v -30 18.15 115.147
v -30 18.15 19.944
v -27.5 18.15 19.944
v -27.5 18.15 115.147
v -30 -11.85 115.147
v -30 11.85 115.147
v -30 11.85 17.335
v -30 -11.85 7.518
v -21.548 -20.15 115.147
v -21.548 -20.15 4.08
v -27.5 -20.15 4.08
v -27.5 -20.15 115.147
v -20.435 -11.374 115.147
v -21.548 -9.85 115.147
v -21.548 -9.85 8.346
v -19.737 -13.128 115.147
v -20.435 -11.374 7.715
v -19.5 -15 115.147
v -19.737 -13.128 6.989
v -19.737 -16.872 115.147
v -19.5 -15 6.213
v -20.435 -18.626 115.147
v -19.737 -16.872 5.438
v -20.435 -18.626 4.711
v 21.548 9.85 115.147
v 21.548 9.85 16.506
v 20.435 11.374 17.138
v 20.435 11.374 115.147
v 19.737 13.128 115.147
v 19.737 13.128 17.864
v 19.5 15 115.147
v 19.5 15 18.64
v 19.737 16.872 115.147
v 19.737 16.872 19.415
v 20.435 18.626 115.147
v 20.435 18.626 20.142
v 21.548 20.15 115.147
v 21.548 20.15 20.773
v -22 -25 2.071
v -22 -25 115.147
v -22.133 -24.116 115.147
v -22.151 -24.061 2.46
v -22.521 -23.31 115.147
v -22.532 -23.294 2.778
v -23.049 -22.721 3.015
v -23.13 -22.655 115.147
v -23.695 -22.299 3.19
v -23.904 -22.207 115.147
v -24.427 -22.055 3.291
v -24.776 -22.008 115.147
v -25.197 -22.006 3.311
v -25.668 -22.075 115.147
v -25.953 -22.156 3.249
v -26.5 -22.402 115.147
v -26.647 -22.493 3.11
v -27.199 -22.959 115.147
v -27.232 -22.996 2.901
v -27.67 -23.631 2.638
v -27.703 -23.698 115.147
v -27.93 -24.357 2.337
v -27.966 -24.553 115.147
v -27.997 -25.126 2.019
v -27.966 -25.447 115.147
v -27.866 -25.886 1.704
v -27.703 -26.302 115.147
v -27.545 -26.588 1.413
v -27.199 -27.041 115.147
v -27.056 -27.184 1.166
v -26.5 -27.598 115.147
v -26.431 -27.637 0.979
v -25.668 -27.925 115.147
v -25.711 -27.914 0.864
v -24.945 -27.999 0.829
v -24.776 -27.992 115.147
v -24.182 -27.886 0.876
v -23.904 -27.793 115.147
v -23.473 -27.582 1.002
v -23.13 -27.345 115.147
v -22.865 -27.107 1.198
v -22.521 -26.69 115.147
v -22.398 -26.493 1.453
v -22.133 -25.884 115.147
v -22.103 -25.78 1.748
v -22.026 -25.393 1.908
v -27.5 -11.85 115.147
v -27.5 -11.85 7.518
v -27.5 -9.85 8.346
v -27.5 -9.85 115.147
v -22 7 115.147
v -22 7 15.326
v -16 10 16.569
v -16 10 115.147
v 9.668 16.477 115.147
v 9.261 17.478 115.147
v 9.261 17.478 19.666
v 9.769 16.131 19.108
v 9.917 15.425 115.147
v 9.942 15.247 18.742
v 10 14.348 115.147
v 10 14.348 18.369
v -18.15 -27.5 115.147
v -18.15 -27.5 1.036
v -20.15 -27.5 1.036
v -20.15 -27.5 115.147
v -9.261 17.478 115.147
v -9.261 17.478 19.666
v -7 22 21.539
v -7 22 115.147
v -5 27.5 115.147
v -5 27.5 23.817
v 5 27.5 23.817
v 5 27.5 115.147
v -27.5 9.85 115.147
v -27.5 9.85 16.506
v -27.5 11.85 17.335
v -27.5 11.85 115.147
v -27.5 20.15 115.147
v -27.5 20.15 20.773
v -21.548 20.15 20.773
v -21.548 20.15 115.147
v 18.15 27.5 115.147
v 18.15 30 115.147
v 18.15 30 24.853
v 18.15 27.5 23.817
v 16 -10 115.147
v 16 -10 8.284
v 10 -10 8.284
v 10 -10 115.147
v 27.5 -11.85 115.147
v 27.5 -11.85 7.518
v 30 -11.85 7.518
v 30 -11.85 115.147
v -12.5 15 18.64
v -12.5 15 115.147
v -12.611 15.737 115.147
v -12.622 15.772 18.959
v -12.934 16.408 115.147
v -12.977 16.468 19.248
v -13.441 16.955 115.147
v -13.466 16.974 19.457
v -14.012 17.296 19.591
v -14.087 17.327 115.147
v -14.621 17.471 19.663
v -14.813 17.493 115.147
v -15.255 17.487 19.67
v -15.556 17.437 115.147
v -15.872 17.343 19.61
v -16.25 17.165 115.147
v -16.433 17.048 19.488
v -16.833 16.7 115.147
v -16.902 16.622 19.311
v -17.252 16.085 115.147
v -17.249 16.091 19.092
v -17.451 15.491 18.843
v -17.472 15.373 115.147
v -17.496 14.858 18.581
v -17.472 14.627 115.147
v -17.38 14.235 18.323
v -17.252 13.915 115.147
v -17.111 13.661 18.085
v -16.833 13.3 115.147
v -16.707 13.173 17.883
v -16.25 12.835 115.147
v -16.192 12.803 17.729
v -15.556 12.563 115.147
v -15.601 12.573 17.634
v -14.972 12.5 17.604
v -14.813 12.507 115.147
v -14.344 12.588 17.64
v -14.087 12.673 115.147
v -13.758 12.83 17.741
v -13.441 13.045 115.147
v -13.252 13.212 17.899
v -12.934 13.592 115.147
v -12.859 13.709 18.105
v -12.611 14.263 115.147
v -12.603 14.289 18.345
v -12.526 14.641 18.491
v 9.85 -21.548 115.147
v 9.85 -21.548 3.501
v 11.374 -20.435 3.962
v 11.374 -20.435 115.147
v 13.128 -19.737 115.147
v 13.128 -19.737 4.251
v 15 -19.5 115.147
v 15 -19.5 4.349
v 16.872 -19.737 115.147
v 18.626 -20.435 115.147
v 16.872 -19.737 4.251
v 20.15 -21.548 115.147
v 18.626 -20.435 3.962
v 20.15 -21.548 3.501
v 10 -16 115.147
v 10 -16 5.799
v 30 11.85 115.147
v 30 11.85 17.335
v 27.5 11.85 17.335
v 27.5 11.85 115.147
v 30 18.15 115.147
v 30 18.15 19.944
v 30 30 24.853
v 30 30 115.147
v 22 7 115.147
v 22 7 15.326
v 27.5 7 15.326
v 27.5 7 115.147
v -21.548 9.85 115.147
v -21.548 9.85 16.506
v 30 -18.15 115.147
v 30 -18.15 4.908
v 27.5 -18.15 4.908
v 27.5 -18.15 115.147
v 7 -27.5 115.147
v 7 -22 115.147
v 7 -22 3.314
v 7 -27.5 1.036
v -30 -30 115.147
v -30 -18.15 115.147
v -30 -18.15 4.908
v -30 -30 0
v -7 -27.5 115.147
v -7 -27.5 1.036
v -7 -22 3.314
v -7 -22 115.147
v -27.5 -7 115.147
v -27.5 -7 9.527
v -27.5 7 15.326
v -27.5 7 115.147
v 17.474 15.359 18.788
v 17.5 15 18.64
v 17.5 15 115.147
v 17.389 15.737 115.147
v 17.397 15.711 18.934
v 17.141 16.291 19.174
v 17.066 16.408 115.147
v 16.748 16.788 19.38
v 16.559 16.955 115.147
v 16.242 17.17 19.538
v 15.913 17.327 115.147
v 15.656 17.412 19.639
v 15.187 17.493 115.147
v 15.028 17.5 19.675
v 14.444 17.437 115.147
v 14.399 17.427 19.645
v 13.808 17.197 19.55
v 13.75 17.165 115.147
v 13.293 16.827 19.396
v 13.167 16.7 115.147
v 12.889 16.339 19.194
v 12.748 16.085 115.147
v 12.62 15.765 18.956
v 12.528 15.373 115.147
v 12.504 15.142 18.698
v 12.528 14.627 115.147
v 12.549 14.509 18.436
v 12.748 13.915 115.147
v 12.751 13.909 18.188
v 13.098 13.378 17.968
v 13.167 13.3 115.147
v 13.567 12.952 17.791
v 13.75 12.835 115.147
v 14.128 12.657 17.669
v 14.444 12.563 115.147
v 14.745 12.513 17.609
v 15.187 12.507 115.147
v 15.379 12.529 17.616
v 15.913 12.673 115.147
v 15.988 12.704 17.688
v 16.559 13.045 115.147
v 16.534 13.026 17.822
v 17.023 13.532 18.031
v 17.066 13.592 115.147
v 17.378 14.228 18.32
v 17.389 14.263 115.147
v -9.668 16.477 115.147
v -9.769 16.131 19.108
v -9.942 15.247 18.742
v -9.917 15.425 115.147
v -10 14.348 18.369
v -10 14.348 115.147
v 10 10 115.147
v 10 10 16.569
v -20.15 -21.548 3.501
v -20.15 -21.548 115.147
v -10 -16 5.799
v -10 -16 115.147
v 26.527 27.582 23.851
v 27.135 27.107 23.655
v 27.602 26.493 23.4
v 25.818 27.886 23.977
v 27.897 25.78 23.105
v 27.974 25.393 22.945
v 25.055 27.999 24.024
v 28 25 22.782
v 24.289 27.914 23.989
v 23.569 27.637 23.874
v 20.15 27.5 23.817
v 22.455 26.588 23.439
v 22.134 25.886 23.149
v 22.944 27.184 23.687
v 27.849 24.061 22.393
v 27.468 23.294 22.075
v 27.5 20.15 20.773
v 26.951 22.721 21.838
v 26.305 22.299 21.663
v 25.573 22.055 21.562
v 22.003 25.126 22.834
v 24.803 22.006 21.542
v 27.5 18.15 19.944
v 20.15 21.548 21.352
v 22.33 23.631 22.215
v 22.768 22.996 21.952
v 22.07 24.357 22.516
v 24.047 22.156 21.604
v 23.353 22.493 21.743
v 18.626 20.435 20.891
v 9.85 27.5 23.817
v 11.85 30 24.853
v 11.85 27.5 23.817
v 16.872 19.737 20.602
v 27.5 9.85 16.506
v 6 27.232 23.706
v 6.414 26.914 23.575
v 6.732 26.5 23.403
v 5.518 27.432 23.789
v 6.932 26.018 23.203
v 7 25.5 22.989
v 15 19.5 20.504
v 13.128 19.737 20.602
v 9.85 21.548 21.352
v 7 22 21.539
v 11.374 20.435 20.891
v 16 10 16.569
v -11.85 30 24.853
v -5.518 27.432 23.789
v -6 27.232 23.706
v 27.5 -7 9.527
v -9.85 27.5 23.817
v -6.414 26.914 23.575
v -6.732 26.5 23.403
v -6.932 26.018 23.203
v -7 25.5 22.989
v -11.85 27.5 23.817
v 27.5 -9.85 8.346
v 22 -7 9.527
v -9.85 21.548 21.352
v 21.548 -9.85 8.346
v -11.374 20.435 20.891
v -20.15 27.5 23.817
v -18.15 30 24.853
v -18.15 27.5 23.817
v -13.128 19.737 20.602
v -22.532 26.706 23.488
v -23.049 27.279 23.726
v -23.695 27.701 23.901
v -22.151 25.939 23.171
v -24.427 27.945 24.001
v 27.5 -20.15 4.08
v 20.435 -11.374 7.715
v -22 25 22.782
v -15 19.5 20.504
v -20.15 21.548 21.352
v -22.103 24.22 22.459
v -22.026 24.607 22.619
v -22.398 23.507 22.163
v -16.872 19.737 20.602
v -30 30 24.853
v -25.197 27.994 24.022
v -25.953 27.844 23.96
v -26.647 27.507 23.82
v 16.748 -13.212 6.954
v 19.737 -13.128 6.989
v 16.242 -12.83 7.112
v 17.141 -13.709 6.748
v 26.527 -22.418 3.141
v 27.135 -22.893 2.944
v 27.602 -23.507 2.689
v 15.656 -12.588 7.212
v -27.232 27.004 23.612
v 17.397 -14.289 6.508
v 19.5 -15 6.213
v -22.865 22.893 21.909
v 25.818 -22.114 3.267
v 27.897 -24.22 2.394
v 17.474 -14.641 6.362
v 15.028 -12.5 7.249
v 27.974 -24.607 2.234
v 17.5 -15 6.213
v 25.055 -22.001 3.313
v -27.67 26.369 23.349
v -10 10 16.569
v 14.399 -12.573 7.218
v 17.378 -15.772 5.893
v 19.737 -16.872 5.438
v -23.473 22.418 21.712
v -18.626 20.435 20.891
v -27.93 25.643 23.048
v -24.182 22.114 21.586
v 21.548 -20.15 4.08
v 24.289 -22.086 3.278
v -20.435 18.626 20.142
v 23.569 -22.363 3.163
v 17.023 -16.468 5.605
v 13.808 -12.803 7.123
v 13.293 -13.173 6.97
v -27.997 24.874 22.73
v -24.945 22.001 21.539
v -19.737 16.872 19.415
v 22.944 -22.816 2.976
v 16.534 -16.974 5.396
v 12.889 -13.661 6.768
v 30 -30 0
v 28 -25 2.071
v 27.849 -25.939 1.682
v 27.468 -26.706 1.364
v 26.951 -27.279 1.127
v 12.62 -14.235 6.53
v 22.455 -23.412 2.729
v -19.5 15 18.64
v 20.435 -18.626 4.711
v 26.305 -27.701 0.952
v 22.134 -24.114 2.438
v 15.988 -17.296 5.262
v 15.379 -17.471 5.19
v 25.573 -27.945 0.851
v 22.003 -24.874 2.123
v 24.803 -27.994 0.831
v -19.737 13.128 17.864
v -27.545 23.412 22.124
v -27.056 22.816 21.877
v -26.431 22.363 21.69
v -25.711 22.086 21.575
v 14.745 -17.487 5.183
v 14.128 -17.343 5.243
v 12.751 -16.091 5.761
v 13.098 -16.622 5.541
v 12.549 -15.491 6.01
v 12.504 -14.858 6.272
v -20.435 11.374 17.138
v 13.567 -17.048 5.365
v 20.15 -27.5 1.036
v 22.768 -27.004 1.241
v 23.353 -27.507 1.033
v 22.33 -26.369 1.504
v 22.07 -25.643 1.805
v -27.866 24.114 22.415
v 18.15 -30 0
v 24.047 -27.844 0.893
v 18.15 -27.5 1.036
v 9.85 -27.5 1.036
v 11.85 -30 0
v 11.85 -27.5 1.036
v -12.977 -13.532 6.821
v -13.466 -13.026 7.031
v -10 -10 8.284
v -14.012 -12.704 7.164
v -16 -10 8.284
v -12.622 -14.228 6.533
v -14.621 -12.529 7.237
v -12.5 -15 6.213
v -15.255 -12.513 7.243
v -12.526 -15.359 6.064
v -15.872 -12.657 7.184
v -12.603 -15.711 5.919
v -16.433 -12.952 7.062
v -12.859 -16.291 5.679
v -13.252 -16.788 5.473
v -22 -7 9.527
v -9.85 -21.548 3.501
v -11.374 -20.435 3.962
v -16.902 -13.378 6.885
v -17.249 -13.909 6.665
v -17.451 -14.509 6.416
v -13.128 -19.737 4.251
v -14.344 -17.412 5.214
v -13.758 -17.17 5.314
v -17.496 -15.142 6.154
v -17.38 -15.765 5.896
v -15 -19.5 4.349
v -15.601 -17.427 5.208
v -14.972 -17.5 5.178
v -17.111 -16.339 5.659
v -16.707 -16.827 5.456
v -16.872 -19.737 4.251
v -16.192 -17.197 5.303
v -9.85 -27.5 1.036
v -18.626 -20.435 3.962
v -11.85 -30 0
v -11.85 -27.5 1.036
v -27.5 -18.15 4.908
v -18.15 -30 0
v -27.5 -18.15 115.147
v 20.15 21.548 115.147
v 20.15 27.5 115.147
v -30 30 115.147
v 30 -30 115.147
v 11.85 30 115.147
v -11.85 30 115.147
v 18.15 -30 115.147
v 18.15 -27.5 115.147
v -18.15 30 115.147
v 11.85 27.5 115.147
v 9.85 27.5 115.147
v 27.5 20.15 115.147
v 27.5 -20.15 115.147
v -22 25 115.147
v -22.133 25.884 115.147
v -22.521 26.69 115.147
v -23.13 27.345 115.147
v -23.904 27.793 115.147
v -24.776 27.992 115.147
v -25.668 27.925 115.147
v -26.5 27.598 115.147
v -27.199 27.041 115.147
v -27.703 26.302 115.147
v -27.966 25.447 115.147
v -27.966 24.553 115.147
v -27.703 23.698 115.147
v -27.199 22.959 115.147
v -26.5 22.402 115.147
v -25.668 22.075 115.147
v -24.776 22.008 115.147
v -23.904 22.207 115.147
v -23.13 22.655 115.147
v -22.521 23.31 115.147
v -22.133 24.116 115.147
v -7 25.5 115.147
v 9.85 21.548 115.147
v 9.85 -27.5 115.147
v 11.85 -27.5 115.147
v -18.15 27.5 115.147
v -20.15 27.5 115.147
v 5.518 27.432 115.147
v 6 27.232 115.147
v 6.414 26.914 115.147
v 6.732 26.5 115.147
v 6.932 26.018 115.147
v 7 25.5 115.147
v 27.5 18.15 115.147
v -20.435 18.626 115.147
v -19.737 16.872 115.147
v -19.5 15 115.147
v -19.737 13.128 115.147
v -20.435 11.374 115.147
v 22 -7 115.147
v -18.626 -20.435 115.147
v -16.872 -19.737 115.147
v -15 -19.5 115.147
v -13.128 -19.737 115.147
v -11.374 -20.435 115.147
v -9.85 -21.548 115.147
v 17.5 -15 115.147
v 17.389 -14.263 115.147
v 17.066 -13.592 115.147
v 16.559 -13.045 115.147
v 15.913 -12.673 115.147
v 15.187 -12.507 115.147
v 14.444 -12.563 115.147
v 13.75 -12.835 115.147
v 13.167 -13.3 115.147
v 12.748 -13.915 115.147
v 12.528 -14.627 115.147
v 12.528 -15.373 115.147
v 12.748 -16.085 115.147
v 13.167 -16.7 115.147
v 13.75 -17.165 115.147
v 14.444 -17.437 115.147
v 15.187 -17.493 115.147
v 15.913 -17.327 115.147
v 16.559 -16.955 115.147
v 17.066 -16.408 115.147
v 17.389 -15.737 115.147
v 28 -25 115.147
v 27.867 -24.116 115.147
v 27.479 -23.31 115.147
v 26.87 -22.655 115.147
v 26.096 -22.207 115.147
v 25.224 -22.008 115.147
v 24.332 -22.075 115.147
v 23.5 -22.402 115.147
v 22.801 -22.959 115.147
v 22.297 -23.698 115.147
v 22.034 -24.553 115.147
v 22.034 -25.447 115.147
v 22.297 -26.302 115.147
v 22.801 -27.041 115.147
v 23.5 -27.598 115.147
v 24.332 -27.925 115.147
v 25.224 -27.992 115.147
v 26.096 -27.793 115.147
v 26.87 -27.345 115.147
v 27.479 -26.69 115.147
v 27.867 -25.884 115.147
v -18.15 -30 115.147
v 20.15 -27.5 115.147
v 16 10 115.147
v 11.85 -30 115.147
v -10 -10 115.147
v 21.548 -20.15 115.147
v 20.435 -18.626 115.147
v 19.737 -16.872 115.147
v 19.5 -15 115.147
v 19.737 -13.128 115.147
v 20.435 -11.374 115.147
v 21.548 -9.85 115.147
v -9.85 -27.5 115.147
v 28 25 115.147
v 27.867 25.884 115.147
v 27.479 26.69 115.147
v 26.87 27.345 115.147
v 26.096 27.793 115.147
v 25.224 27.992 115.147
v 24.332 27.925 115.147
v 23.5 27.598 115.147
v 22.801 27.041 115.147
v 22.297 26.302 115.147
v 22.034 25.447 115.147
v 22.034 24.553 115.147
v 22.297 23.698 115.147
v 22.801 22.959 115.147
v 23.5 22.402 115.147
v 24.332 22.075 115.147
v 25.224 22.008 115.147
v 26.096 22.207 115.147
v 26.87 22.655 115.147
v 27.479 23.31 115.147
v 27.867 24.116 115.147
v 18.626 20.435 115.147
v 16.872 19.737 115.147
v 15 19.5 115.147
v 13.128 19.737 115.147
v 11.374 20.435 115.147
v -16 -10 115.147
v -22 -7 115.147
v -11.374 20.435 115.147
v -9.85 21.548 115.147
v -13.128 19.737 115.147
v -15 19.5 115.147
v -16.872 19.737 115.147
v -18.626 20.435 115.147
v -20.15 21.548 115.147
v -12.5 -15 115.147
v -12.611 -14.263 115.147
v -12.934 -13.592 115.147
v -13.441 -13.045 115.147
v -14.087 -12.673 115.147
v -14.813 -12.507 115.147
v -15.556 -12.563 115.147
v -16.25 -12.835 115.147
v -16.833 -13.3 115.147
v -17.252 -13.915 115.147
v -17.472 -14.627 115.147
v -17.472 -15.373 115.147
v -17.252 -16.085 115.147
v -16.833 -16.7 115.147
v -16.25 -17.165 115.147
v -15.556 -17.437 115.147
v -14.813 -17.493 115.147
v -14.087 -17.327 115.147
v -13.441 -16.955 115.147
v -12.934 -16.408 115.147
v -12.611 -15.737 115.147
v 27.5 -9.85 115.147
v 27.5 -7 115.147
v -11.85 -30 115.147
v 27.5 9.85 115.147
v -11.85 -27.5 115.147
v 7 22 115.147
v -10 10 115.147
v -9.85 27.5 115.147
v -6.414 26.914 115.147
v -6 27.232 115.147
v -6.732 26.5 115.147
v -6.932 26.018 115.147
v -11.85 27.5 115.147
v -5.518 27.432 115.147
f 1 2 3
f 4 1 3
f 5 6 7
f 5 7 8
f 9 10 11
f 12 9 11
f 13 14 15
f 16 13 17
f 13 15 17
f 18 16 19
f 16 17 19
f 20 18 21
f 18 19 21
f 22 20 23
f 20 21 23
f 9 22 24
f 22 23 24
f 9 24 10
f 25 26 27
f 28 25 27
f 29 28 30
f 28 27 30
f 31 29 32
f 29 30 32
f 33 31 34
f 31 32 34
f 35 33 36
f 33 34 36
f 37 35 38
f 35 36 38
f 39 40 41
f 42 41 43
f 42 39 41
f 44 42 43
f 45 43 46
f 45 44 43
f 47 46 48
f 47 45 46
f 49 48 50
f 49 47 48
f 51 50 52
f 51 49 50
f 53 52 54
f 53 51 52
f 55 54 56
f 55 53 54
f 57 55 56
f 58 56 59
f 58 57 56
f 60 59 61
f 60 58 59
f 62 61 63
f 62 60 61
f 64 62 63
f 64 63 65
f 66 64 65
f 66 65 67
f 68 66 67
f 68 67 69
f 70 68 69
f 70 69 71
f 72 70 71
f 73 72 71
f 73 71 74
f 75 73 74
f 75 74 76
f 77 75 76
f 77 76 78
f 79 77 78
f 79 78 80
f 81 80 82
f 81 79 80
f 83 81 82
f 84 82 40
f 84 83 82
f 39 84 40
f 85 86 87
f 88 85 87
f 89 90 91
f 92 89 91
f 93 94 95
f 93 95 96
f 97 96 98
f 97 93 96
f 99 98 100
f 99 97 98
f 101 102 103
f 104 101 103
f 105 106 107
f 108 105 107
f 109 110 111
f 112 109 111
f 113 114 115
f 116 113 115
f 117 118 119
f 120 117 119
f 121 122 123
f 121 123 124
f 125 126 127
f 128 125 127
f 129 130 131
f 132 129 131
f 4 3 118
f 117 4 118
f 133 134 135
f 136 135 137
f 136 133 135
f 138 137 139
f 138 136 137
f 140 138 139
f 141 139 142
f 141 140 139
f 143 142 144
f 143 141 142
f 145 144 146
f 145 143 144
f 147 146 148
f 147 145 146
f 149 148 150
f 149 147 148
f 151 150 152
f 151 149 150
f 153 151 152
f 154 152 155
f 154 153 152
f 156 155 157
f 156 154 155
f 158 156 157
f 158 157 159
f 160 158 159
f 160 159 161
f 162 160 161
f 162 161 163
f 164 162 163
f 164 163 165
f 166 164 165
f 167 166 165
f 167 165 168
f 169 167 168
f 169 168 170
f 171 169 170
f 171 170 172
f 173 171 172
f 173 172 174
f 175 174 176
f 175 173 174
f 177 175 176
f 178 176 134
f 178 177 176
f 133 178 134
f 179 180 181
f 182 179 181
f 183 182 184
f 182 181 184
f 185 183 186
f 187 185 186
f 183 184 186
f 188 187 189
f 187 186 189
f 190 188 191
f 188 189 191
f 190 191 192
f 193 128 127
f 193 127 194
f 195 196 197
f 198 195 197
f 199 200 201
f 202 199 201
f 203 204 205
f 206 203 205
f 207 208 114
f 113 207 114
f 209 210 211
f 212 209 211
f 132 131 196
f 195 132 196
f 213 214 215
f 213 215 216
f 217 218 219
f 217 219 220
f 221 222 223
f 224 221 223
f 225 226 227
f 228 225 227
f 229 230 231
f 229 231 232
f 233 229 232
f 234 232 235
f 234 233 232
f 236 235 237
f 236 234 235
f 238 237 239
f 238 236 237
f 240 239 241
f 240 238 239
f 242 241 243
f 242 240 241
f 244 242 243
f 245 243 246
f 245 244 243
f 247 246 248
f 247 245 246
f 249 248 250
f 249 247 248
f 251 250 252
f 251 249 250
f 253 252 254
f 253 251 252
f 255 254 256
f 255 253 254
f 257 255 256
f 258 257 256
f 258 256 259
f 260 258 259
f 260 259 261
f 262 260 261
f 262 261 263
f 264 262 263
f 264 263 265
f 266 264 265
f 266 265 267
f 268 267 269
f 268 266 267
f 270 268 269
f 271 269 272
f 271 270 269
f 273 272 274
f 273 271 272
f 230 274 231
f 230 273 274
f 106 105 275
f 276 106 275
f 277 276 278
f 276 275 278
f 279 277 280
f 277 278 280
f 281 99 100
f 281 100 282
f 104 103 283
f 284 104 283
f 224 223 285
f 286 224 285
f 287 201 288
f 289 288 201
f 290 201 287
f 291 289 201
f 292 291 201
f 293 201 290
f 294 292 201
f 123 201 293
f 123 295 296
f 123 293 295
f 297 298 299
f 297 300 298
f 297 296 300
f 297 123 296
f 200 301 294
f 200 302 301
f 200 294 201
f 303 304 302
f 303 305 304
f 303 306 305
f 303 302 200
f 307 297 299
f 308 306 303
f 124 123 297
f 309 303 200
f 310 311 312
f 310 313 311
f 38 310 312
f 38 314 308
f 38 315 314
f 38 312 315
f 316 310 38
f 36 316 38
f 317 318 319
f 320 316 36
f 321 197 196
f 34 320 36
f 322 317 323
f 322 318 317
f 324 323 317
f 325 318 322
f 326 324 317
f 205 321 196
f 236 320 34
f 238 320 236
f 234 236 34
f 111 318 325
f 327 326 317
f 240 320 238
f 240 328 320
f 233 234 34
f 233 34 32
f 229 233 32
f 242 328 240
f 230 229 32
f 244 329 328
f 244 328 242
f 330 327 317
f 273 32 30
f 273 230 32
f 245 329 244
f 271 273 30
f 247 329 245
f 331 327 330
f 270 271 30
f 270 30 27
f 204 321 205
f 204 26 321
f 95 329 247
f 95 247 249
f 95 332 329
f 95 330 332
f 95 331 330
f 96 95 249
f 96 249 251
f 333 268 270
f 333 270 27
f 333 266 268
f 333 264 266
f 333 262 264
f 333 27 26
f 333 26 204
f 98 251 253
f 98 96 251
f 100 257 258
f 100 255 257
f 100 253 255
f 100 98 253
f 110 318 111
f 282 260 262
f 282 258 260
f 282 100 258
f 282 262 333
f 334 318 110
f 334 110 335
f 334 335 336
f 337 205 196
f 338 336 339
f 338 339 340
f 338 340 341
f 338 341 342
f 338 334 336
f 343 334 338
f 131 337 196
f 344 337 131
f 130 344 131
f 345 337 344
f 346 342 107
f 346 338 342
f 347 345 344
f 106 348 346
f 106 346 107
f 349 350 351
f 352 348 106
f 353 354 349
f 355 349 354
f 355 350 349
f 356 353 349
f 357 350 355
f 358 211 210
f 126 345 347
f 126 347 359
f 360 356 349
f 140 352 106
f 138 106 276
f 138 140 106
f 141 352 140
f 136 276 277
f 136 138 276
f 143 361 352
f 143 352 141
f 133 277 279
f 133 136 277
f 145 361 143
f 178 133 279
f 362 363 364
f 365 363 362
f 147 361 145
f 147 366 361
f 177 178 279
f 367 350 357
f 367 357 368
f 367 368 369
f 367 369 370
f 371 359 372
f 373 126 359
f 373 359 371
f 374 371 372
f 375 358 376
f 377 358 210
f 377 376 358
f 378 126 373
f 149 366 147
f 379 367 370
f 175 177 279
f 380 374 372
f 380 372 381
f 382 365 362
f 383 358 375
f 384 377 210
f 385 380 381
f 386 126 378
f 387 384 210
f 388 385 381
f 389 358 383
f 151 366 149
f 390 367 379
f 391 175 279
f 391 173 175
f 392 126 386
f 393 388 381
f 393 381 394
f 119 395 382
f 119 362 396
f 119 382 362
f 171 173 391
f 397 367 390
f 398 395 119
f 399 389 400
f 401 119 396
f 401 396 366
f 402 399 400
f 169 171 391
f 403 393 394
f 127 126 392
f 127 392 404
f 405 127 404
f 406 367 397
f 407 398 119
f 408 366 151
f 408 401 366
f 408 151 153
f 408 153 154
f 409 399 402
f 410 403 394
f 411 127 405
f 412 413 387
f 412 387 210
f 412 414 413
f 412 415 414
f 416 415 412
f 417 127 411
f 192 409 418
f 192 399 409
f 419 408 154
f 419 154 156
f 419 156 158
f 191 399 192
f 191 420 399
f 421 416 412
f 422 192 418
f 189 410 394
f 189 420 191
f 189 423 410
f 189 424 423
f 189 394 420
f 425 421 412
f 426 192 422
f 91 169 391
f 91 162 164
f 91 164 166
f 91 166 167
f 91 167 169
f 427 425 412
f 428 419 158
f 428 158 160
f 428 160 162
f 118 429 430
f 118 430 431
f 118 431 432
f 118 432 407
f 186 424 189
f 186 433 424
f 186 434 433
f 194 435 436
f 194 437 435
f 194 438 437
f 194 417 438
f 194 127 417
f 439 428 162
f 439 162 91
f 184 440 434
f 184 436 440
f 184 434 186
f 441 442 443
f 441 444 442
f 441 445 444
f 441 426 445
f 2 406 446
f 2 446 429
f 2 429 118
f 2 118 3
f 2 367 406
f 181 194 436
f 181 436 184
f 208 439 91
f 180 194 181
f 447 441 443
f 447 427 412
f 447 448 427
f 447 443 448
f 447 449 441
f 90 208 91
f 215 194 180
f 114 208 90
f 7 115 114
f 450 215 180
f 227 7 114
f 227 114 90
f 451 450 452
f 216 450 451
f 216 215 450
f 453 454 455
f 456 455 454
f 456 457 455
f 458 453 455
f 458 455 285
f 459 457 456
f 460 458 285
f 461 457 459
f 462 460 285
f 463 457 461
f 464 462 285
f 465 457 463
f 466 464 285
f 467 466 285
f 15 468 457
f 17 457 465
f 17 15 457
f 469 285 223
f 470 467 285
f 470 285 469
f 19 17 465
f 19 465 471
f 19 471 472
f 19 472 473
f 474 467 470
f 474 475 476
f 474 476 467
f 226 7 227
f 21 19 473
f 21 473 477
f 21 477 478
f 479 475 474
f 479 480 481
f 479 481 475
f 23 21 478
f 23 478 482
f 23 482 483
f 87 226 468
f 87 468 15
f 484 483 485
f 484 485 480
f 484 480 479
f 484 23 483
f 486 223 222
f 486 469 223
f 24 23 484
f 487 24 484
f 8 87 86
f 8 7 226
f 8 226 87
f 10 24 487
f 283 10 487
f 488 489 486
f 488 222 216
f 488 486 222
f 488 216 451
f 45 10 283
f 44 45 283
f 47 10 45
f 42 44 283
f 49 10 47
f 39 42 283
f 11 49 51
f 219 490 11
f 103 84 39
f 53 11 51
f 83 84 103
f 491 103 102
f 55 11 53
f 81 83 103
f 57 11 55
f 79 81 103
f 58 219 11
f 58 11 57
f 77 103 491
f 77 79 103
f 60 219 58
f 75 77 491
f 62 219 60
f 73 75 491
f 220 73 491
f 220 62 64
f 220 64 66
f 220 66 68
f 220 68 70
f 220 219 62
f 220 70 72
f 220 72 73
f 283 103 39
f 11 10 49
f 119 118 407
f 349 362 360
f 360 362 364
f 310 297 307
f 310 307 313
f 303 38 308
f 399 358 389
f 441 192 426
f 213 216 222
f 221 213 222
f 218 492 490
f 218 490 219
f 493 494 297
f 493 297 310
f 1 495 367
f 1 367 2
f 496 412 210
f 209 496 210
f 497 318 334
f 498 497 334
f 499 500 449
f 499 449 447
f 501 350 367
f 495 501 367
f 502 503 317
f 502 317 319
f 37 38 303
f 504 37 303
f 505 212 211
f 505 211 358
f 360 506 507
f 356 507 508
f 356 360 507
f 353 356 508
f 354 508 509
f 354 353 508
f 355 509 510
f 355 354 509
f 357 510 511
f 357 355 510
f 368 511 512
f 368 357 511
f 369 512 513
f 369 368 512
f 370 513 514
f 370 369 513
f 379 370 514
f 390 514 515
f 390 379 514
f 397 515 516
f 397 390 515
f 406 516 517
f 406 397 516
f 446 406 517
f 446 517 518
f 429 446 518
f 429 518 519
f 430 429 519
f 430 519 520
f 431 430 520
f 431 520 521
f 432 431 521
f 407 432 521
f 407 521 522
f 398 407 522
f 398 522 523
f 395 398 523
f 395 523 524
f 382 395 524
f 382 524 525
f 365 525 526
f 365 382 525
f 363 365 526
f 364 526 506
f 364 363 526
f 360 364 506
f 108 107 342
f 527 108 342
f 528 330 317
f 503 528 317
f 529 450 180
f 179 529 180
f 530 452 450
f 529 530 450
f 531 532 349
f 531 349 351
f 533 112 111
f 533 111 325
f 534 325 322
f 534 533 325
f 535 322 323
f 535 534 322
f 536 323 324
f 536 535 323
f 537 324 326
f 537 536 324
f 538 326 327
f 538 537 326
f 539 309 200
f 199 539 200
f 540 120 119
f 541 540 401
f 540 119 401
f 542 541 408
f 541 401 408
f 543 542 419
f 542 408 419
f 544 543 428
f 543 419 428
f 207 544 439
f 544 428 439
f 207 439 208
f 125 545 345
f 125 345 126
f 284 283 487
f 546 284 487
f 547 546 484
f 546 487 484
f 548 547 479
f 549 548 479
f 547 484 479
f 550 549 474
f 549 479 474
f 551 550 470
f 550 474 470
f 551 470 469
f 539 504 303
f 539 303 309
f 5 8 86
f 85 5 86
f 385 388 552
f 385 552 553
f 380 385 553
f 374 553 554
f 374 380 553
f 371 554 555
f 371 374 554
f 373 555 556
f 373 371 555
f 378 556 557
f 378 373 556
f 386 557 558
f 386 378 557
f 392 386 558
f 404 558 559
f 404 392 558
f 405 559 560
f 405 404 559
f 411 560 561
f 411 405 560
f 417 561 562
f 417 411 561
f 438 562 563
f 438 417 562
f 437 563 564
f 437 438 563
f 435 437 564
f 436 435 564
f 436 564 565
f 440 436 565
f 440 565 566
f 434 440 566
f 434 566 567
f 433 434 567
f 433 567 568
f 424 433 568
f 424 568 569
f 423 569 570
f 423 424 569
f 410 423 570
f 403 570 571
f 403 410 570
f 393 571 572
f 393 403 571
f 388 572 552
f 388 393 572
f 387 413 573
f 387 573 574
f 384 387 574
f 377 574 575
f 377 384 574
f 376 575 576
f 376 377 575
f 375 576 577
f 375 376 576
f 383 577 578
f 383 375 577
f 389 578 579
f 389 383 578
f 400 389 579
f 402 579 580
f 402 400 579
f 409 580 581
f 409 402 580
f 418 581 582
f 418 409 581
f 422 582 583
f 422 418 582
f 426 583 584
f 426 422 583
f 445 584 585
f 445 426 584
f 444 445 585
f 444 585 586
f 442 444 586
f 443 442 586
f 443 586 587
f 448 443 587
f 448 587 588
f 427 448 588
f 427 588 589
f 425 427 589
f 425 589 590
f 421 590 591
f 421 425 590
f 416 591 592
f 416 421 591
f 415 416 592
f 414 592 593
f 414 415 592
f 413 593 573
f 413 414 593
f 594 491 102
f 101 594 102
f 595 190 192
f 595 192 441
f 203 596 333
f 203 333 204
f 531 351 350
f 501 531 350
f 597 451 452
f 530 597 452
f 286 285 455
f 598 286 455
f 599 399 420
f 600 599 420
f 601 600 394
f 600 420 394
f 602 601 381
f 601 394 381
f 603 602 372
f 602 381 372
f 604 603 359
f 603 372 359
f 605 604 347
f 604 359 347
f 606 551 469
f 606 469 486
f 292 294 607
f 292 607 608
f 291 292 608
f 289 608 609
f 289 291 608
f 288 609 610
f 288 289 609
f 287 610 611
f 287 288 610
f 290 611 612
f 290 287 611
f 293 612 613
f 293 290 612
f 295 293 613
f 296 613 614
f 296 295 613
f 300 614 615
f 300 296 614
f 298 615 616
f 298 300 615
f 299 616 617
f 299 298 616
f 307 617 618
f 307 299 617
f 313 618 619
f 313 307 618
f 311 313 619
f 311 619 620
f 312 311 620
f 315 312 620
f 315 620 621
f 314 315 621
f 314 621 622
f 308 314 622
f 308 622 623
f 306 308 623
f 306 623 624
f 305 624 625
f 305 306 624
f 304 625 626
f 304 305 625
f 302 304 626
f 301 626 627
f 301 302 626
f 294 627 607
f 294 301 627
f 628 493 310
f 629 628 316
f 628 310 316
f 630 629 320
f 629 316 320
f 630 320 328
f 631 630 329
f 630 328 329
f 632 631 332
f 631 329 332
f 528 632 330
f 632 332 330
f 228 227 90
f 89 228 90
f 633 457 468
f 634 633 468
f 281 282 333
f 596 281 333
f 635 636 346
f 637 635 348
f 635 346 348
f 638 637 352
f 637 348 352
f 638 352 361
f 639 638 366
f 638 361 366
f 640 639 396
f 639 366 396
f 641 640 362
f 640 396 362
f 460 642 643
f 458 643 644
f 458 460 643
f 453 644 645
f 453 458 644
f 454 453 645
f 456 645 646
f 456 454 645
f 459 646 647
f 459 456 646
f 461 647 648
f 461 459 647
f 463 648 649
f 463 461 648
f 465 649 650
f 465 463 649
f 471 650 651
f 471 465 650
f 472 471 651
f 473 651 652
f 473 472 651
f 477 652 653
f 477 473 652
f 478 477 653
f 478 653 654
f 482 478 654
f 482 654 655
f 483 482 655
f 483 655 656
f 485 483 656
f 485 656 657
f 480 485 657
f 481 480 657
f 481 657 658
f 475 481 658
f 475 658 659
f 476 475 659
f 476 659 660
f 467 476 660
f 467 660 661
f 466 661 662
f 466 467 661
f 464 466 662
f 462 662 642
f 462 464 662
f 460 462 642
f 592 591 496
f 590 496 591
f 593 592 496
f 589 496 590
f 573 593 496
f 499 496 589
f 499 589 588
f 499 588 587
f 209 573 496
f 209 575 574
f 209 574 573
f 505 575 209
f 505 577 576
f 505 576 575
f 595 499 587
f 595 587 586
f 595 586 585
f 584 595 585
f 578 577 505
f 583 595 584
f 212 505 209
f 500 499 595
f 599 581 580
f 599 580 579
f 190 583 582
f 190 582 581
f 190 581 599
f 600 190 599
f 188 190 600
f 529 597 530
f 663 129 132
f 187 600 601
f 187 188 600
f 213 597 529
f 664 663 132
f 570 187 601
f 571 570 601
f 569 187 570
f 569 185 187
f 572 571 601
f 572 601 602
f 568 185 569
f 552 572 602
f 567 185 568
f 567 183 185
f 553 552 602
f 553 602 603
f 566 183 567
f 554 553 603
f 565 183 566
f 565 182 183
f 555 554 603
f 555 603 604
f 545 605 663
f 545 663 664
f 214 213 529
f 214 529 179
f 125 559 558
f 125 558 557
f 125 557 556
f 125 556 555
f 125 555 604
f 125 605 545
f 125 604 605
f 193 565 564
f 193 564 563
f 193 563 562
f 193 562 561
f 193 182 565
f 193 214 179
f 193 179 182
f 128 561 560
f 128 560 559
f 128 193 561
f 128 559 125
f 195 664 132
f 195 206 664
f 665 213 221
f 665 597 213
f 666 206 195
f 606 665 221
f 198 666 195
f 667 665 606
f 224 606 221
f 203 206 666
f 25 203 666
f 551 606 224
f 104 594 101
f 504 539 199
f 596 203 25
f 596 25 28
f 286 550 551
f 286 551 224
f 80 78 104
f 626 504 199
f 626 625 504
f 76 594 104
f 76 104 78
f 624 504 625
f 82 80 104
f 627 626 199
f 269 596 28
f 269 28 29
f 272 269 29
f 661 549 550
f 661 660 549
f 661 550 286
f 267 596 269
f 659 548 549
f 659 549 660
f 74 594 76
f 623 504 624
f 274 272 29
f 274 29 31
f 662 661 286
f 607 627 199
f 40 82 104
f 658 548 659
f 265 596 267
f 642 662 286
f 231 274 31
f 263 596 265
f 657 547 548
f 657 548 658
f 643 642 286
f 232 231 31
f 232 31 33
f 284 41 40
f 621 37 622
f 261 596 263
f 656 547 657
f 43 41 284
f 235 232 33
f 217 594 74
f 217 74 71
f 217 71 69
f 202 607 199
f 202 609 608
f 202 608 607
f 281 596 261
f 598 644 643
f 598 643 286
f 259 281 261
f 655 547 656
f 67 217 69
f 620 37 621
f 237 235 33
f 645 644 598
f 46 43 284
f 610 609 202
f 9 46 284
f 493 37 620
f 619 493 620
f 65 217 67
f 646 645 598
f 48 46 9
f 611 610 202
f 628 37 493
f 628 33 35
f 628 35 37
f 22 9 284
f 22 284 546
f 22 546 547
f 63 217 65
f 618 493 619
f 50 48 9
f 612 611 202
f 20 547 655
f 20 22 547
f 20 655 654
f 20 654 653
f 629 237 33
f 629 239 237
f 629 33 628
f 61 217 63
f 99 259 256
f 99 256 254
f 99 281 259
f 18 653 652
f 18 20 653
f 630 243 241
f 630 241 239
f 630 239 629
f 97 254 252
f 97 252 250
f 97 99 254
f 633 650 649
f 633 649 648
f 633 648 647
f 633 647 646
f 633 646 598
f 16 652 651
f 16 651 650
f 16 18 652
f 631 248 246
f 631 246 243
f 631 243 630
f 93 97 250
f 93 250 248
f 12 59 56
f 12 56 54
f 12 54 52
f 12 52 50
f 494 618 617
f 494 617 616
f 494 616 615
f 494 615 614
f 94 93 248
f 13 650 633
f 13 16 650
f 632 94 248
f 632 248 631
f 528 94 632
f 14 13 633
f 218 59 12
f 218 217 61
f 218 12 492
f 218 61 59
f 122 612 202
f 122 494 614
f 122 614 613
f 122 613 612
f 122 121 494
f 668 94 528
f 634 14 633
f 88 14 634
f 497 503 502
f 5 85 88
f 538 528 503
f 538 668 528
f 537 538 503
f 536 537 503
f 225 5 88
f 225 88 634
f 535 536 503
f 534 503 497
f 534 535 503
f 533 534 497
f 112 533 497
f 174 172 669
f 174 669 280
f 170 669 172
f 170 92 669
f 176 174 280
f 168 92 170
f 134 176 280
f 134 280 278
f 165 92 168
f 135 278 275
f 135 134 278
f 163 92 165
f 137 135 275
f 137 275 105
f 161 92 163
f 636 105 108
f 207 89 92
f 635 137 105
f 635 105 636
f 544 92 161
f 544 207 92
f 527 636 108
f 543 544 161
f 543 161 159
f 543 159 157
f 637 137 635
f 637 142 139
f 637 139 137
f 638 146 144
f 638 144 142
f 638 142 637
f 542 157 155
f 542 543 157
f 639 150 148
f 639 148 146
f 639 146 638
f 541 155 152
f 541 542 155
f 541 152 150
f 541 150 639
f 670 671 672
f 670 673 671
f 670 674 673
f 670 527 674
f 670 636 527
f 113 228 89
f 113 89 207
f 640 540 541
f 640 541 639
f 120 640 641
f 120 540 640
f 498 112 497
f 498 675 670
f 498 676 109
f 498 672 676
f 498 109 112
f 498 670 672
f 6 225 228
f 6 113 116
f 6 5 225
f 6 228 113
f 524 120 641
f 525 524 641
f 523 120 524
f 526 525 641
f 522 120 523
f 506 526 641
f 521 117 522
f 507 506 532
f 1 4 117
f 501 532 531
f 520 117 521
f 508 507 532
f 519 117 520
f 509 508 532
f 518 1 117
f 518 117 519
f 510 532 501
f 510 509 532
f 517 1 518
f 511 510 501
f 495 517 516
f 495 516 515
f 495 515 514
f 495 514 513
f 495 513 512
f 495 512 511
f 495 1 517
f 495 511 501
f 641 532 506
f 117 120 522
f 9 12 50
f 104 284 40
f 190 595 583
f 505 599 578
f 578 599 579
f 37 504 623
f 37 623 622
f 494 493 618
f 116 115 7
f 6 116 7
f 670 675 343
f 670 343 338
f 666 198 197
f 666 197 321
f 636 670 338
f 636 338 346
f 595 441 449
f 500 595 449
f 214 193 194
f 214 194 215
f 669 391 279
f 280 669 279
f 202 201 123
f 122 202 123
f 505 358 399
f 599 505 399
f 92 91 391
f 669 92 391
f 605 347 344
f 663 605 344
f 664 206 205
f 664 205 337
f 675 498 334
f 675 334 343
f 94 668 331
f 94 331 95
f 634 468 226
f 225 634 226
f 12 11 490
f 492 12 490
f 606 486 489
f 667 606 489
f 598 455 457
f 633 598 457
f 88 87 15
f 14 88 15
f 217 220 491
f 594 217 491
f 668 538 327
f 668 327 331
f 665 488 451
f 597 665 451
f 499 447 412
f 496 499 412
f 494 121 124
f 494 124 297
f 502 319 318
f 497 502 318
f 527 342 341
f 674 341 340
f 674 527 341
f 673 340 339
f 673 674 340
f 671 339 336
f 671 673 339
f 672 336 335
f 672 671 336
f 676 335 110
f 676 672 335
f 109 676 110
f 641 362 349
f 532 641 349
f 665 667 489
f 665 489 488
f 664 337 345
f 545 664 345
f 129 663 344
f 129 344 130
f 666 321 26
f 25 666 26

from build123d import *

# Parameters (mm, degrees)
F0_R          = 3
F0_R_2        = 2.5
F1_DEPTH      = 140
F2_R          = 2
F3_R          = 7
F6_DEPTH      = 30
F6_DEPTH_BACK = 30
F7_W          = 131.1645284295
F7_H          = 50.7057756186
F8_DEPTH      = 30
F8_DEPTH_BACK = 30


# Not quite as in the source:
# - a feature names something its author has since deleted; it is built from what else it names


with BuildPart() as f1:
    # F0 (on Top) → F1 (new body)
    with BuildSketch(Plane.XY):
        with BuildLine():
            Line((18.15, -30), (30, -30))
            Line((30, -30), (30, -18.15))
            Line((30, -18.15), (27.5, -18.15))
            Line((27.5, -18.15), (27.5, -20.15))
            Line((27.5, -20.15), (21.5477069044, -20.15))
            ThreePointArc((21.5477069044, -20.15), (19.5, -15), (21.5477069044, -9.85))
            Line((21.5477069044, -9.85), (27.5, -9.85))
            Line((27.5, -9.85), (27.5, -11.85))
            Line((27.5, -11.85), (30, -11.85))
            Line((30, -11.85), (30, 11.85))
            Line((30, 11.85), (27.5, 11.85))
            Line((27.5, 11.85), (27.5, 9.85))
            Line((27.5, 9.85), (21.5477069044, 9.85))
            ThreePointArc((21.5477069044, 9.85), (19.5, 15), (21.5477069044, 20.15))
            Line((21.5477069044, 20.15), (27.5, 20.15))
            Line((27.5, 20.15), (27.5, 18.15))
            Line((27.5, 18.15), (30, 18.15))
            Line((30, 18.15), (30, 30))
            Line((30, 30), (18.15, 30))
            Line((18.15, 30), (18.15, 27.5))
            Line((18.15, 27.5), (20.15, 27.5))
            Line((20.15, 27.5), (20.15, 21.5477069044))
            ThreePointArc((20.15, 21.5477069044), (15, 19.5), (9.85, 21.5477069044))
            Line((9.85, 21.5477069044), (9.85, 27.5))
            Line((9.85, 27.5), (11.85, 27.5))
            Line((11.85, 27.5), (11.85, 30))
            Line((11.85, 30), (-11.85, 30))
            Line((-11.85, 30), (-11.85, 27.5))
            Line((-11.85, 27.5), (-9.85, 27.5))
            Line((-9.85, 27.5), (-9.85, 21.5477069044))
            ThreePointArc((-9.85, 21.5477069044), (-15, 19.5), (-20.15, 21.5477069044))
            Line((-20.15, 21.5477069044), (-20.15, 27.5))
            Line((-20.15, 27.5), (-18.15, 27.5))
            Line((-18.15, 27.5), (-18.15, 30))
            Line((-18.15, 30), (-30, 30))
            Line((-30, 30), (-30, 18.15))
            Line((-30, 18.15), (-27.5, 18.15))
            Line((-27.5, 18.15), (-27.5, 20.15))
            Line((-27.5, 20.15), (-21.5477069044, 20.15))
            ThreePointArc((-21.5477069044, 20.15), (-19.5, 15), (-21.5477069044, 9.85))
            Line((-21.5477069044, 9.85), (-27.5, 9.85))
            Line((-27.5, 9.85), (-27.5, 11.85))
            Line((-27.5, 11.85), (-30, 11.85))
            Line((-30, 11.85), (-30, -11.85))
            Line((-30, -11.85), (-27.5, -11.85))
            Line((-27.5, -11.85), (-27.5, -9.85))
            Line((-27.5, -9.85), (-21.5477069044, -9.85))
            ThreePointArc((-21.5477069044, -9.85), (-19.5, -15), (-21.5477069044, -20.15))
            Line((-21.5477069044, -20.15), (-27.5, -20.15))
            Line((-27.5, -20.15), (-27.5, -18.15))
            Line((-27.5, -18.15), (-30, -18.15))
            Line((-30, -18.15), (-30, -30))
            Line((-30, -30), (-18.15, -30))
            Line((-18.15, -30), (-18.15, -27.5))
            Line((-18.15, -27.5), (-20.15, -27.5))
            Line((-20.15, -27.5), (-20.15, -21.5477069044))
            ThreePointArc((-20.15, -21.5477069044), (-15, -19.5), (-9.85, -21.5477069044))
            Line((-9.85, -21.5477069044), (-9.85, -27.5))
            Line((-9.85, -27.5), (-11.85, -27.5))
            Line((-11.85, -27.5), (-11.85, -30))
            Line((-11.85, -30), (11.85, -30))
            Line((11.85, -30), (11.85, -27.5))
            Line((11.85, -27.5), (9.85, -27.5))
            Line((9.85, -27.5), (9.85, -21.5477069044))
            ThreePointArc((9.85, -21.5477069044), (15, -19.5), (20.15, -21.5477069044))
            Line((20.15, -21.5477069044), (20.15, -27.5))
            Line((20.15, -27.5), (18.15, -27.5))
            Line((18.15, -27.5), (18.15, -30))
        make_face()
        with Locations((-25, -25)):
            Circle(F0_R, mode=Mode.SUBTRACT)
        with Locations((-15, -15)):
            Circle(F0_R_2, mode=Mode.SUBTRACT)
        with Locations((25, -25)):
            Circle(F0_R, mode=Mode.SUBTRACT)
        with Locations((15, -15)):
            Circle(F0_R_2, mode=Mode.SUBTRACT)
        with Locations((-25, 25)):
            Circle(F0_R, mode=Mode.SUBTRACT)
        with Locations((-15, 15)):
            Circle(F0_R_2, mode=Mode.SUBTRACT)
        Polygon((-7, 22), (-7, 27.5), (0, 27.5), (7, 27.5), (7, 22), (10, 16), (10, 10), (16, 10), (22, 7), (27.5, 7), (27.5, 0), (27.5, -7), (22, -7), (16, -10), (10, -10), (10, -16), (7, -22), (7, -27.5), (0, -27.5), (-7, -27.5), (-7, -22), (-10, -16), (-10, -10), (-16, -10), (-22, -7), (-27.5, -7), (-27.5, 0), (-27.5, 7), (-22, 7), (-16, 10), (-10, 10), (-10, 16), align=None, mode=Mode.SUBTRACT)
        with Locations((15, 15)):
            Circle(F0_R_2, mode=Mode.SUBTRACT)
        with Locations((25, 25)):
            Circle(F0_R, mode=Mode.SUBTRACT)
    extrude(amount=F1_DEPTH)

    # F2
    f2_edges = [f1.edges().sort_by_distance(p)[0] for p in [
        (-7, 27.5, 70),
        (7, 27.5, 70),
    ]]
    fillet(f2_edges, radius=F2_R)

    # F3
    f3_edges = [f1.edges().sort_by_distance(p)[0] for p in [
        (-10, 16, 70),
        (10, 16, 70),
    ]]
    fillet(f3_edges, radius=F3_R)

    # F5 (on Right) → F6 (cut, two sides)
    with BuildSketch(Plane.YZ) as f6_sk:
        Polygon((214.5999793503, -135.2321386172), (130.9673605882, 66.674863855), (-30, 0), (53.6326187621, -201.9070024722), align=None)
        Polygon((30, 140), (-2.0081647111, 217.2745453523), (-162.3392477394, 150.863236292), (-130.3310830283, 73.5886909397), align=None)
    extrude(amount=-F6_DEPTH, mode=Mode.SUBTRACT)
    extrude(f6_sk.sketch, amount=F6_DEPTH_BACK, mode=Mode.SUBTRACT)

    # F7 (on Right) → F8 (cut, two sides)
    with BuildSketch(Plane.YZ) as f8_sk:
        with Locations((35.5822642148, 140.5000740669)):
            Rectangle(F7_W, F7_H)
    extrude(amount=F8_DEPTH, mode=Mode.SUBTRACT)
    extrude(f8_sk.sketch, amount=-F8_DEPTH_BACK, mode=Mode.SUBTRACT)


solid = f1.part
